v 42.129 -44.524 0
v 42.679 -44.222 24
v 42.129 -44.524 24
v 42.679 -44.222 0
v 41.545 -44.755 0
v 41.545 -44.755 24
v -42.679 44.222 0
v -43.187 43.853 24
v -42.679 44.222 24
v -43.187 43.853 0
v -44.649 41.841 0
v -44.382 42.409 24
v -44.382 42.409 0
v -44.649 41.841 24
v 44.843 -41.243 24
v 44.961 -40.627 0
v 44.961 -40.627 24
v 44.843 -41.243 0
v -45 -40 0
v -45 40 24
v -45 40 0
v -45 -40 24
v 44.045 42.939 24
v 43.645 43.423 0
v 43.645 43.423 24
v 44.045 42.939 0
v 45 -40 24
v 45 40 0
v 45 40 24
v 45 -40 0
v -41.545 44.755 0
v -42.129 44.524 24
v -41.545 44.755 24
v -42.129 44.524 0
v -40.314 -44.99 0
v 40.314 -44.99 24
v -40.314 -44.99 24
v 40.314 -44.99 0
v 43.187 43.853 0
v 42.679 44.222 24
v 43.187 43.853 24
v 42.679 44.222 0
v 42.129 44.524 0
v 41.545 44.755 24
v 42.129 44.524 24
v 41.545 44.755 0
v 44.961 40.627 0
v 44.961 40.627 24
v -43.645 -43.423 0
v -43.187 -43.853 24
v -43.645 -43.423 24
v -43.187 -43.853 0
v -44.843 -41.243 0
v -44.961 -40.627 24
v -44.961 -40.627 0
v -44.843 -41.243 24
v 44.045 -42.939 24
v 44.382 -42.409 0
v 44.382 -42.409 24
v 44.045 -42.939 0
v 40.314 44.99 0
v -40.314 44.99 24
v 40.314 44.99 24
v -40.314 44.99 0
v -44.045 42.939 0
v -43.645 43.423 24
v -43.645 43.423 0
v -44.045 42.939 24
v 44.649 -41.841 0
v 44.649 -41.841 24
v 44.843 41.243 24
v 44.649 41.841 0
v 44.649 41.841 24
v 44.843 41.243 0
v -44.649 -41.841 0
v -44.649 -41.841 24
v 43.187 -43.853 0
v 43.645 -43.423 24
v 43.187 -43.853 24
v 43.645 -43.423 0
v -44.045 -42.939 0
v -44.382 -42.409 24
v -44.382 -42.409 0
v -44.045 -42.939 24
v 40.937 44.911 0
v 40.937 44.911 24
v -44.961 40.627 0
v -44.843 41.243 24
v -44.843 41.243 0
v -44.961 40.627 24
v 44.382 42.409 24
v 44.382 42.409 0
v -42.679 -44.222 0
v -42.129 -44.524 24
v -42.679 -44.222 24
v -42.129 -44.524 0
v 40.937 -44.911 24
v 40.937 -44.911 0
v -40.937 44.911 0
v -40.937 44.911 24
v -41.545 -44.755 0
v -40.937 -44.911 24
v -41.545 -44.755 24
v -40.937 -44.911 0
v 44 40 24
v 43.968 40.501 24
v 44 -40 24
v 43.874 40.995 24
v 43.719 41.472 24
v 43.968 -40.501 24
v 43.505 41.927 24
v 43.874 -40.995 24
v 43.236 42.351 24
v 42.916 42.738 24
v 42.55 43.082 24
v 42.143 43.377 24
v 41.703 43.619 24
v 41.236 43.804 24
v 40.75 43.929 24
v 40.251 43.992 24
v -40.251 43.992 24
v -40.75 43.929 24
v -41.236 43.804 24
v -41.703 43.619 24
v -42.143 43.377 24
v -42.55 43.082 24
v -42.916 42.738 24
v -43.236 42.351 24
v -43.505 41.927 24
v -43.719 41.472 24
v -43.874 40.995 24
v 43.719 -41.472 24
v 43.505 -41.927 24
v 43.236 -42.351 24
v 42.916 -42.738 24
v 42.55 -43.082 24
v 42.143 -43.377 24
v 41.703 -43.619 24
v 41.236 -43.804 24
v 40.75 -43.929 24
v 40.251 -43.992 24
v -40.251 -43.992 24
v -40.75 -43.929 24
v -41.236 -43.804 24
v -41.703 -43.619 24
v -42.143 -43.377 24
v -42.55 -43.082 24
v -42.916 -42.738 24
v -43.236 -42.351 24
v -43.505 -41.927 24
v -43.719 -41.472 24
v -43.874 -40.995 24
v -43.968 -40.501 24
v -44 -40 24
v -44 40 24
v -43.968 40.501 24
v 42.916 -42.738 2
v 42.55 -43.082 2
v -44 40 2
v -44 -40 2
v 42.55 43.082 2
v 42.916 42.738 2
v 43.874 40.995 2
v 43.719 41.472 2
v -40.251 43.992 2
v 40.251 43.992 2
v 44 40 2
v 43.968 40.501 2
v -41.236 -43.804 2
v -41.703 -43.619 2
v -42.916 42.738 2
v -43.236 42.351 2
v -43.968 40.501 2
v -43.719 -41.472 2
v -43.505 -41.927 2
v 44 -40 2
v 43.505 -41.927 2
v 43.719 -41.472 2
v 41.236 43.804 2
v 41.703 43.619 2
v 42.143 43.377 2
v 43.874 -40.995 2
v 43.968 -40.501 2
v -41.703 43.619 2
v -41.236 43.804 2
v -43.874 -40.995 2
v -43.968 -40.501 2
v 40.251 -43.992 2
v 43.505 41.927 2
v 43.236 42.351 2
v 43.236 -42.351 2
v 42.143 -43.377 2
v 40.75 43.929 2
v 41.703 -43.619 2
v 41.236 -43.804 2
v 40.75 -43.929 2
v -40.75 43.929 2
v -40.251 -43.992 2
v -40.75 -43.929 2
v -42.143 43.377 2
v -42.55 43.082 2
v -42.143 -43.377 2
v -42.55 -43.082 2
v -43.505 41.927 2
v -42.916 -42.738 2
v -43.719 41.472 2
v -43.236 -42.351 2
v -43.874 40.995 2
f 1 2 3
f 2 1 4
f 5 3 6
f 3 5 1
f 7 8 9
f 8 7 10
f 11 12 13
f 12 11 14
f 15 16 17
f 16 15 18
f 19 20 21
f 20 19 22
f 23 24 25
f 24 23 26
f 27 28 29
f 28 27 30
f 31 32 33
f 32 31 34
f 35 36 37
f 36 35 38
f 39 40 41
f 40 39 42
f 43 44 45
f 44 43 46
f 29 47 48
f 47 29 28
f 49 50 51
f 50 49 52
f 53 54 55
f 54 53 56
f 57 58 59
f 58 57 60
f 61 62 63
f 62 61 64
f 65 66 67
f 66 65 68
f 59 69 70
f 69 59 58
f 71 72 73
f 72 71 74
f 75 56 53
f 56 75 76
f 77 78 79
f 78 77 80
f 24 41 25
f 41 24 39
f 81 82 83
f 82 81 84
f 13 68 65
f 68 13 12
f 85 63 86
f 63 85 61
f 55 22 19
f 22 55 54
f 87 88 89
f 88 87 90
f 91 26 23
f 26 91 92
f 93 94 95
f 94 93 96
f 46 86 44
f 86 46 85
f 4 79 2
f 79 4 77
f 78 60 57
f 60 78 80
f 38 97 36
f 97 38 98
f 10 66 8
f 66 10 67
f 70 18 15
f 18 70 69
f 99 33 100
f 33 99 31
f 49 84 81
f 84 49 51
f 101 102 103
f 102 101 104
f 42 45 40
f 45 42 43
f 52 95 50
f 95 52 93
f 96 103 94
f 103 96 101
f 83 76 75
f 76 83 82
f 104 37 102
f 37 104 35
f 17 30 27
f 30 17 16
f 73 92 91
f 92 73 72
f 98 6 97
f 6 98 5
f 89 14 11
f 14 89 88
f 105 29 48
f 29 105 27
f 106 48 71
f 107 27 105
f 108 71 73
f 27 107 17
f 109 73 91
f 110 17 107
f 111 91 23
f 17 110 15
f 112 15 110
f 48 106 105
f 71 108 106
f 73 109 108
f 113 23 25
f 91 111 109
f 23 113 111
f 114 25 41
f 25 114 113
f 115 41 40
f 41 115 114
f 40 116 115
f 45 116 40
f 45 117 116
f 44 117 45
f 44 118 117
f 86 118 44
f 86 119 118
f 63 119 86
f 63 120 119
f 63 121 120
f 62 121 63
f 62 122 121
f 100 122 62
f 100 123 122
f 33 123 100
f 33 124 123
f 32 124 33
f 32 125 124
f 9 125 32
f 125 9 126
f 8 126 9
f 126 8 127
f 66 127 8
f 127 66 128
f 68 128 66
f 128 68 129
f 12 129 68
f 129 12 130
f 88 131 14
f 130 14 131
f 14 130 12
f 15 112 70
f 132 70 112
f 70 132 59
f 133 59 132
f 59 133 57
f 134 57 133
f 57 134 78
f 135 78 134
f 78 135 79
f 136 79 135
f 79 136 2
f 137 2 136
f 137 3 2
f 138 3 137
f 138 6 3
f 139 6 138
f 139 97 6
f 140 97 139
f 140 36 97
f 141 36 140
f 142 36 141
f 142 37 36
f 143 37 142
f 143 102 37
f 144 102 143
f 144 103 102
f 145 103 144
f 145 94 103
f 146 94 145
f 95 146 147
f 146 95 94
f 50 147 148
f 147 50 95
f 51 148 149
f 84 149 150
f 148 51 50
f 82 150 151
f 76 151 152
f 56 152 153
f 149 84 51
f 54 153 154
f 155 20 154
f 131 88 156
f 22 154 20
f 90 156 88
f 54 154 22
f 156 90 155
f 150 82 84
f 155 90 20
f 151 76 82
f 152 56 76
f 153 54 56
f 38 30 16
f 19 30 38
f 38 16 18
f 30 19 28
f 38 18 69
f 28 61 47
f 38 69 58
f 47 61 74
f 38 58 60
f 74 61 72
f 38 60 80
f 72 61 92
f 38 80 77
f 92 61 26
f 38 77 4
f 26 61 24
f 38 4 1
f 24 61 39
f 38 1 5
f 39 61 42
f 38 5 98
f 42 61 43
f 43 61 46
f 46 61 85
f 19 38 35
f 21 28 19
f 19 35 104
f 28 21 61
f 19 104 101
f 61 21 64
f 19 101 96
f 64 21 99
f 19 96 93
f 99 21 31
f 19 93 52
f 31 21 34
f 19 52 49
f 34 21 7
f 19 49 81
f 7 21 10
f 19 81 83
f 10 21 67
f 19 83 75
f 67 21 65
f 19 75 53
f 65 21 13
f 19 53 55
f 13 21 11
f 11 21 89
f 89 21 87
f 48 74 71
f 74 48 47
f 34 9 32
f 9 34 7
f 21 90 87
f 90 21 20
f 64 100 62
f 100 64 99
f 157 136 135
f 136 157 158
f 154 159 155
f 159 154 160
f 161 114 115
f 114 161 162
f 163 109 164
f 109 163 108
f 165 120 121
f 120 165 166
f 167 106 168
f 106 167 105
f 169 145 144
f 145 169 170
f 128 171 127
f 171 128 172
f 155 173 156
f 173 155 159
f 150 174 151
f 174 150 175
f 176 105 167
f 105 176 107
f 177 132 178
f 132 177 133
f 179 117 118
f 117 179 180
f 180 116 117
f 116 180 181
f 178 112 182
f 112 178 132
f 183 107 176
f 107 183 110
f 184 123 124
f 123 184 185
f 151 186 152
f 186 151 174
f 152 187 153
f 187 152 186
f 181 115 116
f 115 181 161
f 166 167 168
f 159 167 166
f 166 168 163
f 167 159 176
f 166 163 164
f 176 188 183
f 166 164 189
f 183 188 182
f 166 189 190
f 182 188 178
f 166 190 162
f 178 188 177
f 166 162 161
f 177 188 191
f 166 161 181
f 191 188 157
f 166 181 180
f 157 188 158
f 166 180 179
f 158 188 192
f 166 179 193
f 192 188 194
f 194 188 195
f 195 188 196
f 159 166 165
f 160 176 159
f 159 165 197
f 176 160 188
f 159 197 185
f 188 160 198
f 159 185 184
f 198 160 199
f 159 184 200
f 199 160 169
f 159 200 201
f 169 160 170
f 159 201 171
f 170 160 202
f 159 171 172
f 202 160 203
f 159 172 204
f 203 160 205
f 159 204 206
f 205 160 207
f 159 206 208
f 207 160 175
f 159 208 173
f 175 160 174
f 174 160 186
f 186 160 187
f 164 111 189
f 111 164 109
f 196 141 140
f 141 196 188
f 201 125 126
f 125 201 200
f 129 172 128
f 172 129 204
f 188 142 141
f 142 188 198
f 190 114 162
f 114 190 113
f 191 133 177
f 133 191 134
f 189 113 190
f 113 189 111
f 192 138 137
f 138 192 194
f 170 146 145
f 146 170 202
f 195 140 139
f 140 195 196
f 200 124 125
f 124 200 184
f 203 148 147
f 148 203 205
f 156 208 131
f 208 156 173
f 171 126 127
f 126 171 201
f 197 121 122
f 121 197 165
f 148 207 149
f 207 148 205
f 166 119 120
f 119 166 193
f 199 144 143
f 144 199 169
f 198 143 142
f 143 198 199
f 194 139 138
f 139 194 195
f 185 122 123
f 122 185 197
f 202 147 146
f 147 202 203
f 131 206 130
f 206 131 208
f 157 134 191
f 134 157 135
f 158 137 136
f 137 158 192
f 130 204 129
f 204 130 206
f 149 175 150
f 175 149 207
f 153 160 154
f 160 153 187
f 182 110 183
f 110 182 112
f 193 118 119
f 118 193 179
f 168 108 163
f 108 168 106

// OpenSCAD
$fn = 50;


difference() {
	union() {
		hull() {
			translate(v = [-40.0000000000, 40.0000000000, 0]) {
				cylinder(h = 24, r = 5);
			}
			translate(v = [40.0000000000, 40.0000000000, 0]) {
				cylinder(h = 24, r = 5);
			}
			translate(v = [-40.0000000000, -40.0000000000, 0]) {
				cylinder(h = 24, r = 5);
			}
			translate(v = [40.0000000000, -40.0000000000, 0]) {
				cylinder(h = 24, r = 5);
			}
		}
	}
	union() {
		translate(v = [0, 0, 2]) {
			hull() {
				translate(v = [-40.0000000000, 40.0000000000, 0]) {
					cylinder(h = 22, r = 4);
				}
				translate(v = [40.0000000000, 40.0000000000, 0]) {
					cylinder(h = 22, r = 4);
				}
				translate(v = [-40.0000000000, -40.0000000000, 0]) {
					cylinder(h = 22, r = 4);
				}
				translate(v = [40.0000000000, -40.0000000000, 0]) {
					cylinder(h = 22, r = 4);
				}
			}
		}
	}
}
